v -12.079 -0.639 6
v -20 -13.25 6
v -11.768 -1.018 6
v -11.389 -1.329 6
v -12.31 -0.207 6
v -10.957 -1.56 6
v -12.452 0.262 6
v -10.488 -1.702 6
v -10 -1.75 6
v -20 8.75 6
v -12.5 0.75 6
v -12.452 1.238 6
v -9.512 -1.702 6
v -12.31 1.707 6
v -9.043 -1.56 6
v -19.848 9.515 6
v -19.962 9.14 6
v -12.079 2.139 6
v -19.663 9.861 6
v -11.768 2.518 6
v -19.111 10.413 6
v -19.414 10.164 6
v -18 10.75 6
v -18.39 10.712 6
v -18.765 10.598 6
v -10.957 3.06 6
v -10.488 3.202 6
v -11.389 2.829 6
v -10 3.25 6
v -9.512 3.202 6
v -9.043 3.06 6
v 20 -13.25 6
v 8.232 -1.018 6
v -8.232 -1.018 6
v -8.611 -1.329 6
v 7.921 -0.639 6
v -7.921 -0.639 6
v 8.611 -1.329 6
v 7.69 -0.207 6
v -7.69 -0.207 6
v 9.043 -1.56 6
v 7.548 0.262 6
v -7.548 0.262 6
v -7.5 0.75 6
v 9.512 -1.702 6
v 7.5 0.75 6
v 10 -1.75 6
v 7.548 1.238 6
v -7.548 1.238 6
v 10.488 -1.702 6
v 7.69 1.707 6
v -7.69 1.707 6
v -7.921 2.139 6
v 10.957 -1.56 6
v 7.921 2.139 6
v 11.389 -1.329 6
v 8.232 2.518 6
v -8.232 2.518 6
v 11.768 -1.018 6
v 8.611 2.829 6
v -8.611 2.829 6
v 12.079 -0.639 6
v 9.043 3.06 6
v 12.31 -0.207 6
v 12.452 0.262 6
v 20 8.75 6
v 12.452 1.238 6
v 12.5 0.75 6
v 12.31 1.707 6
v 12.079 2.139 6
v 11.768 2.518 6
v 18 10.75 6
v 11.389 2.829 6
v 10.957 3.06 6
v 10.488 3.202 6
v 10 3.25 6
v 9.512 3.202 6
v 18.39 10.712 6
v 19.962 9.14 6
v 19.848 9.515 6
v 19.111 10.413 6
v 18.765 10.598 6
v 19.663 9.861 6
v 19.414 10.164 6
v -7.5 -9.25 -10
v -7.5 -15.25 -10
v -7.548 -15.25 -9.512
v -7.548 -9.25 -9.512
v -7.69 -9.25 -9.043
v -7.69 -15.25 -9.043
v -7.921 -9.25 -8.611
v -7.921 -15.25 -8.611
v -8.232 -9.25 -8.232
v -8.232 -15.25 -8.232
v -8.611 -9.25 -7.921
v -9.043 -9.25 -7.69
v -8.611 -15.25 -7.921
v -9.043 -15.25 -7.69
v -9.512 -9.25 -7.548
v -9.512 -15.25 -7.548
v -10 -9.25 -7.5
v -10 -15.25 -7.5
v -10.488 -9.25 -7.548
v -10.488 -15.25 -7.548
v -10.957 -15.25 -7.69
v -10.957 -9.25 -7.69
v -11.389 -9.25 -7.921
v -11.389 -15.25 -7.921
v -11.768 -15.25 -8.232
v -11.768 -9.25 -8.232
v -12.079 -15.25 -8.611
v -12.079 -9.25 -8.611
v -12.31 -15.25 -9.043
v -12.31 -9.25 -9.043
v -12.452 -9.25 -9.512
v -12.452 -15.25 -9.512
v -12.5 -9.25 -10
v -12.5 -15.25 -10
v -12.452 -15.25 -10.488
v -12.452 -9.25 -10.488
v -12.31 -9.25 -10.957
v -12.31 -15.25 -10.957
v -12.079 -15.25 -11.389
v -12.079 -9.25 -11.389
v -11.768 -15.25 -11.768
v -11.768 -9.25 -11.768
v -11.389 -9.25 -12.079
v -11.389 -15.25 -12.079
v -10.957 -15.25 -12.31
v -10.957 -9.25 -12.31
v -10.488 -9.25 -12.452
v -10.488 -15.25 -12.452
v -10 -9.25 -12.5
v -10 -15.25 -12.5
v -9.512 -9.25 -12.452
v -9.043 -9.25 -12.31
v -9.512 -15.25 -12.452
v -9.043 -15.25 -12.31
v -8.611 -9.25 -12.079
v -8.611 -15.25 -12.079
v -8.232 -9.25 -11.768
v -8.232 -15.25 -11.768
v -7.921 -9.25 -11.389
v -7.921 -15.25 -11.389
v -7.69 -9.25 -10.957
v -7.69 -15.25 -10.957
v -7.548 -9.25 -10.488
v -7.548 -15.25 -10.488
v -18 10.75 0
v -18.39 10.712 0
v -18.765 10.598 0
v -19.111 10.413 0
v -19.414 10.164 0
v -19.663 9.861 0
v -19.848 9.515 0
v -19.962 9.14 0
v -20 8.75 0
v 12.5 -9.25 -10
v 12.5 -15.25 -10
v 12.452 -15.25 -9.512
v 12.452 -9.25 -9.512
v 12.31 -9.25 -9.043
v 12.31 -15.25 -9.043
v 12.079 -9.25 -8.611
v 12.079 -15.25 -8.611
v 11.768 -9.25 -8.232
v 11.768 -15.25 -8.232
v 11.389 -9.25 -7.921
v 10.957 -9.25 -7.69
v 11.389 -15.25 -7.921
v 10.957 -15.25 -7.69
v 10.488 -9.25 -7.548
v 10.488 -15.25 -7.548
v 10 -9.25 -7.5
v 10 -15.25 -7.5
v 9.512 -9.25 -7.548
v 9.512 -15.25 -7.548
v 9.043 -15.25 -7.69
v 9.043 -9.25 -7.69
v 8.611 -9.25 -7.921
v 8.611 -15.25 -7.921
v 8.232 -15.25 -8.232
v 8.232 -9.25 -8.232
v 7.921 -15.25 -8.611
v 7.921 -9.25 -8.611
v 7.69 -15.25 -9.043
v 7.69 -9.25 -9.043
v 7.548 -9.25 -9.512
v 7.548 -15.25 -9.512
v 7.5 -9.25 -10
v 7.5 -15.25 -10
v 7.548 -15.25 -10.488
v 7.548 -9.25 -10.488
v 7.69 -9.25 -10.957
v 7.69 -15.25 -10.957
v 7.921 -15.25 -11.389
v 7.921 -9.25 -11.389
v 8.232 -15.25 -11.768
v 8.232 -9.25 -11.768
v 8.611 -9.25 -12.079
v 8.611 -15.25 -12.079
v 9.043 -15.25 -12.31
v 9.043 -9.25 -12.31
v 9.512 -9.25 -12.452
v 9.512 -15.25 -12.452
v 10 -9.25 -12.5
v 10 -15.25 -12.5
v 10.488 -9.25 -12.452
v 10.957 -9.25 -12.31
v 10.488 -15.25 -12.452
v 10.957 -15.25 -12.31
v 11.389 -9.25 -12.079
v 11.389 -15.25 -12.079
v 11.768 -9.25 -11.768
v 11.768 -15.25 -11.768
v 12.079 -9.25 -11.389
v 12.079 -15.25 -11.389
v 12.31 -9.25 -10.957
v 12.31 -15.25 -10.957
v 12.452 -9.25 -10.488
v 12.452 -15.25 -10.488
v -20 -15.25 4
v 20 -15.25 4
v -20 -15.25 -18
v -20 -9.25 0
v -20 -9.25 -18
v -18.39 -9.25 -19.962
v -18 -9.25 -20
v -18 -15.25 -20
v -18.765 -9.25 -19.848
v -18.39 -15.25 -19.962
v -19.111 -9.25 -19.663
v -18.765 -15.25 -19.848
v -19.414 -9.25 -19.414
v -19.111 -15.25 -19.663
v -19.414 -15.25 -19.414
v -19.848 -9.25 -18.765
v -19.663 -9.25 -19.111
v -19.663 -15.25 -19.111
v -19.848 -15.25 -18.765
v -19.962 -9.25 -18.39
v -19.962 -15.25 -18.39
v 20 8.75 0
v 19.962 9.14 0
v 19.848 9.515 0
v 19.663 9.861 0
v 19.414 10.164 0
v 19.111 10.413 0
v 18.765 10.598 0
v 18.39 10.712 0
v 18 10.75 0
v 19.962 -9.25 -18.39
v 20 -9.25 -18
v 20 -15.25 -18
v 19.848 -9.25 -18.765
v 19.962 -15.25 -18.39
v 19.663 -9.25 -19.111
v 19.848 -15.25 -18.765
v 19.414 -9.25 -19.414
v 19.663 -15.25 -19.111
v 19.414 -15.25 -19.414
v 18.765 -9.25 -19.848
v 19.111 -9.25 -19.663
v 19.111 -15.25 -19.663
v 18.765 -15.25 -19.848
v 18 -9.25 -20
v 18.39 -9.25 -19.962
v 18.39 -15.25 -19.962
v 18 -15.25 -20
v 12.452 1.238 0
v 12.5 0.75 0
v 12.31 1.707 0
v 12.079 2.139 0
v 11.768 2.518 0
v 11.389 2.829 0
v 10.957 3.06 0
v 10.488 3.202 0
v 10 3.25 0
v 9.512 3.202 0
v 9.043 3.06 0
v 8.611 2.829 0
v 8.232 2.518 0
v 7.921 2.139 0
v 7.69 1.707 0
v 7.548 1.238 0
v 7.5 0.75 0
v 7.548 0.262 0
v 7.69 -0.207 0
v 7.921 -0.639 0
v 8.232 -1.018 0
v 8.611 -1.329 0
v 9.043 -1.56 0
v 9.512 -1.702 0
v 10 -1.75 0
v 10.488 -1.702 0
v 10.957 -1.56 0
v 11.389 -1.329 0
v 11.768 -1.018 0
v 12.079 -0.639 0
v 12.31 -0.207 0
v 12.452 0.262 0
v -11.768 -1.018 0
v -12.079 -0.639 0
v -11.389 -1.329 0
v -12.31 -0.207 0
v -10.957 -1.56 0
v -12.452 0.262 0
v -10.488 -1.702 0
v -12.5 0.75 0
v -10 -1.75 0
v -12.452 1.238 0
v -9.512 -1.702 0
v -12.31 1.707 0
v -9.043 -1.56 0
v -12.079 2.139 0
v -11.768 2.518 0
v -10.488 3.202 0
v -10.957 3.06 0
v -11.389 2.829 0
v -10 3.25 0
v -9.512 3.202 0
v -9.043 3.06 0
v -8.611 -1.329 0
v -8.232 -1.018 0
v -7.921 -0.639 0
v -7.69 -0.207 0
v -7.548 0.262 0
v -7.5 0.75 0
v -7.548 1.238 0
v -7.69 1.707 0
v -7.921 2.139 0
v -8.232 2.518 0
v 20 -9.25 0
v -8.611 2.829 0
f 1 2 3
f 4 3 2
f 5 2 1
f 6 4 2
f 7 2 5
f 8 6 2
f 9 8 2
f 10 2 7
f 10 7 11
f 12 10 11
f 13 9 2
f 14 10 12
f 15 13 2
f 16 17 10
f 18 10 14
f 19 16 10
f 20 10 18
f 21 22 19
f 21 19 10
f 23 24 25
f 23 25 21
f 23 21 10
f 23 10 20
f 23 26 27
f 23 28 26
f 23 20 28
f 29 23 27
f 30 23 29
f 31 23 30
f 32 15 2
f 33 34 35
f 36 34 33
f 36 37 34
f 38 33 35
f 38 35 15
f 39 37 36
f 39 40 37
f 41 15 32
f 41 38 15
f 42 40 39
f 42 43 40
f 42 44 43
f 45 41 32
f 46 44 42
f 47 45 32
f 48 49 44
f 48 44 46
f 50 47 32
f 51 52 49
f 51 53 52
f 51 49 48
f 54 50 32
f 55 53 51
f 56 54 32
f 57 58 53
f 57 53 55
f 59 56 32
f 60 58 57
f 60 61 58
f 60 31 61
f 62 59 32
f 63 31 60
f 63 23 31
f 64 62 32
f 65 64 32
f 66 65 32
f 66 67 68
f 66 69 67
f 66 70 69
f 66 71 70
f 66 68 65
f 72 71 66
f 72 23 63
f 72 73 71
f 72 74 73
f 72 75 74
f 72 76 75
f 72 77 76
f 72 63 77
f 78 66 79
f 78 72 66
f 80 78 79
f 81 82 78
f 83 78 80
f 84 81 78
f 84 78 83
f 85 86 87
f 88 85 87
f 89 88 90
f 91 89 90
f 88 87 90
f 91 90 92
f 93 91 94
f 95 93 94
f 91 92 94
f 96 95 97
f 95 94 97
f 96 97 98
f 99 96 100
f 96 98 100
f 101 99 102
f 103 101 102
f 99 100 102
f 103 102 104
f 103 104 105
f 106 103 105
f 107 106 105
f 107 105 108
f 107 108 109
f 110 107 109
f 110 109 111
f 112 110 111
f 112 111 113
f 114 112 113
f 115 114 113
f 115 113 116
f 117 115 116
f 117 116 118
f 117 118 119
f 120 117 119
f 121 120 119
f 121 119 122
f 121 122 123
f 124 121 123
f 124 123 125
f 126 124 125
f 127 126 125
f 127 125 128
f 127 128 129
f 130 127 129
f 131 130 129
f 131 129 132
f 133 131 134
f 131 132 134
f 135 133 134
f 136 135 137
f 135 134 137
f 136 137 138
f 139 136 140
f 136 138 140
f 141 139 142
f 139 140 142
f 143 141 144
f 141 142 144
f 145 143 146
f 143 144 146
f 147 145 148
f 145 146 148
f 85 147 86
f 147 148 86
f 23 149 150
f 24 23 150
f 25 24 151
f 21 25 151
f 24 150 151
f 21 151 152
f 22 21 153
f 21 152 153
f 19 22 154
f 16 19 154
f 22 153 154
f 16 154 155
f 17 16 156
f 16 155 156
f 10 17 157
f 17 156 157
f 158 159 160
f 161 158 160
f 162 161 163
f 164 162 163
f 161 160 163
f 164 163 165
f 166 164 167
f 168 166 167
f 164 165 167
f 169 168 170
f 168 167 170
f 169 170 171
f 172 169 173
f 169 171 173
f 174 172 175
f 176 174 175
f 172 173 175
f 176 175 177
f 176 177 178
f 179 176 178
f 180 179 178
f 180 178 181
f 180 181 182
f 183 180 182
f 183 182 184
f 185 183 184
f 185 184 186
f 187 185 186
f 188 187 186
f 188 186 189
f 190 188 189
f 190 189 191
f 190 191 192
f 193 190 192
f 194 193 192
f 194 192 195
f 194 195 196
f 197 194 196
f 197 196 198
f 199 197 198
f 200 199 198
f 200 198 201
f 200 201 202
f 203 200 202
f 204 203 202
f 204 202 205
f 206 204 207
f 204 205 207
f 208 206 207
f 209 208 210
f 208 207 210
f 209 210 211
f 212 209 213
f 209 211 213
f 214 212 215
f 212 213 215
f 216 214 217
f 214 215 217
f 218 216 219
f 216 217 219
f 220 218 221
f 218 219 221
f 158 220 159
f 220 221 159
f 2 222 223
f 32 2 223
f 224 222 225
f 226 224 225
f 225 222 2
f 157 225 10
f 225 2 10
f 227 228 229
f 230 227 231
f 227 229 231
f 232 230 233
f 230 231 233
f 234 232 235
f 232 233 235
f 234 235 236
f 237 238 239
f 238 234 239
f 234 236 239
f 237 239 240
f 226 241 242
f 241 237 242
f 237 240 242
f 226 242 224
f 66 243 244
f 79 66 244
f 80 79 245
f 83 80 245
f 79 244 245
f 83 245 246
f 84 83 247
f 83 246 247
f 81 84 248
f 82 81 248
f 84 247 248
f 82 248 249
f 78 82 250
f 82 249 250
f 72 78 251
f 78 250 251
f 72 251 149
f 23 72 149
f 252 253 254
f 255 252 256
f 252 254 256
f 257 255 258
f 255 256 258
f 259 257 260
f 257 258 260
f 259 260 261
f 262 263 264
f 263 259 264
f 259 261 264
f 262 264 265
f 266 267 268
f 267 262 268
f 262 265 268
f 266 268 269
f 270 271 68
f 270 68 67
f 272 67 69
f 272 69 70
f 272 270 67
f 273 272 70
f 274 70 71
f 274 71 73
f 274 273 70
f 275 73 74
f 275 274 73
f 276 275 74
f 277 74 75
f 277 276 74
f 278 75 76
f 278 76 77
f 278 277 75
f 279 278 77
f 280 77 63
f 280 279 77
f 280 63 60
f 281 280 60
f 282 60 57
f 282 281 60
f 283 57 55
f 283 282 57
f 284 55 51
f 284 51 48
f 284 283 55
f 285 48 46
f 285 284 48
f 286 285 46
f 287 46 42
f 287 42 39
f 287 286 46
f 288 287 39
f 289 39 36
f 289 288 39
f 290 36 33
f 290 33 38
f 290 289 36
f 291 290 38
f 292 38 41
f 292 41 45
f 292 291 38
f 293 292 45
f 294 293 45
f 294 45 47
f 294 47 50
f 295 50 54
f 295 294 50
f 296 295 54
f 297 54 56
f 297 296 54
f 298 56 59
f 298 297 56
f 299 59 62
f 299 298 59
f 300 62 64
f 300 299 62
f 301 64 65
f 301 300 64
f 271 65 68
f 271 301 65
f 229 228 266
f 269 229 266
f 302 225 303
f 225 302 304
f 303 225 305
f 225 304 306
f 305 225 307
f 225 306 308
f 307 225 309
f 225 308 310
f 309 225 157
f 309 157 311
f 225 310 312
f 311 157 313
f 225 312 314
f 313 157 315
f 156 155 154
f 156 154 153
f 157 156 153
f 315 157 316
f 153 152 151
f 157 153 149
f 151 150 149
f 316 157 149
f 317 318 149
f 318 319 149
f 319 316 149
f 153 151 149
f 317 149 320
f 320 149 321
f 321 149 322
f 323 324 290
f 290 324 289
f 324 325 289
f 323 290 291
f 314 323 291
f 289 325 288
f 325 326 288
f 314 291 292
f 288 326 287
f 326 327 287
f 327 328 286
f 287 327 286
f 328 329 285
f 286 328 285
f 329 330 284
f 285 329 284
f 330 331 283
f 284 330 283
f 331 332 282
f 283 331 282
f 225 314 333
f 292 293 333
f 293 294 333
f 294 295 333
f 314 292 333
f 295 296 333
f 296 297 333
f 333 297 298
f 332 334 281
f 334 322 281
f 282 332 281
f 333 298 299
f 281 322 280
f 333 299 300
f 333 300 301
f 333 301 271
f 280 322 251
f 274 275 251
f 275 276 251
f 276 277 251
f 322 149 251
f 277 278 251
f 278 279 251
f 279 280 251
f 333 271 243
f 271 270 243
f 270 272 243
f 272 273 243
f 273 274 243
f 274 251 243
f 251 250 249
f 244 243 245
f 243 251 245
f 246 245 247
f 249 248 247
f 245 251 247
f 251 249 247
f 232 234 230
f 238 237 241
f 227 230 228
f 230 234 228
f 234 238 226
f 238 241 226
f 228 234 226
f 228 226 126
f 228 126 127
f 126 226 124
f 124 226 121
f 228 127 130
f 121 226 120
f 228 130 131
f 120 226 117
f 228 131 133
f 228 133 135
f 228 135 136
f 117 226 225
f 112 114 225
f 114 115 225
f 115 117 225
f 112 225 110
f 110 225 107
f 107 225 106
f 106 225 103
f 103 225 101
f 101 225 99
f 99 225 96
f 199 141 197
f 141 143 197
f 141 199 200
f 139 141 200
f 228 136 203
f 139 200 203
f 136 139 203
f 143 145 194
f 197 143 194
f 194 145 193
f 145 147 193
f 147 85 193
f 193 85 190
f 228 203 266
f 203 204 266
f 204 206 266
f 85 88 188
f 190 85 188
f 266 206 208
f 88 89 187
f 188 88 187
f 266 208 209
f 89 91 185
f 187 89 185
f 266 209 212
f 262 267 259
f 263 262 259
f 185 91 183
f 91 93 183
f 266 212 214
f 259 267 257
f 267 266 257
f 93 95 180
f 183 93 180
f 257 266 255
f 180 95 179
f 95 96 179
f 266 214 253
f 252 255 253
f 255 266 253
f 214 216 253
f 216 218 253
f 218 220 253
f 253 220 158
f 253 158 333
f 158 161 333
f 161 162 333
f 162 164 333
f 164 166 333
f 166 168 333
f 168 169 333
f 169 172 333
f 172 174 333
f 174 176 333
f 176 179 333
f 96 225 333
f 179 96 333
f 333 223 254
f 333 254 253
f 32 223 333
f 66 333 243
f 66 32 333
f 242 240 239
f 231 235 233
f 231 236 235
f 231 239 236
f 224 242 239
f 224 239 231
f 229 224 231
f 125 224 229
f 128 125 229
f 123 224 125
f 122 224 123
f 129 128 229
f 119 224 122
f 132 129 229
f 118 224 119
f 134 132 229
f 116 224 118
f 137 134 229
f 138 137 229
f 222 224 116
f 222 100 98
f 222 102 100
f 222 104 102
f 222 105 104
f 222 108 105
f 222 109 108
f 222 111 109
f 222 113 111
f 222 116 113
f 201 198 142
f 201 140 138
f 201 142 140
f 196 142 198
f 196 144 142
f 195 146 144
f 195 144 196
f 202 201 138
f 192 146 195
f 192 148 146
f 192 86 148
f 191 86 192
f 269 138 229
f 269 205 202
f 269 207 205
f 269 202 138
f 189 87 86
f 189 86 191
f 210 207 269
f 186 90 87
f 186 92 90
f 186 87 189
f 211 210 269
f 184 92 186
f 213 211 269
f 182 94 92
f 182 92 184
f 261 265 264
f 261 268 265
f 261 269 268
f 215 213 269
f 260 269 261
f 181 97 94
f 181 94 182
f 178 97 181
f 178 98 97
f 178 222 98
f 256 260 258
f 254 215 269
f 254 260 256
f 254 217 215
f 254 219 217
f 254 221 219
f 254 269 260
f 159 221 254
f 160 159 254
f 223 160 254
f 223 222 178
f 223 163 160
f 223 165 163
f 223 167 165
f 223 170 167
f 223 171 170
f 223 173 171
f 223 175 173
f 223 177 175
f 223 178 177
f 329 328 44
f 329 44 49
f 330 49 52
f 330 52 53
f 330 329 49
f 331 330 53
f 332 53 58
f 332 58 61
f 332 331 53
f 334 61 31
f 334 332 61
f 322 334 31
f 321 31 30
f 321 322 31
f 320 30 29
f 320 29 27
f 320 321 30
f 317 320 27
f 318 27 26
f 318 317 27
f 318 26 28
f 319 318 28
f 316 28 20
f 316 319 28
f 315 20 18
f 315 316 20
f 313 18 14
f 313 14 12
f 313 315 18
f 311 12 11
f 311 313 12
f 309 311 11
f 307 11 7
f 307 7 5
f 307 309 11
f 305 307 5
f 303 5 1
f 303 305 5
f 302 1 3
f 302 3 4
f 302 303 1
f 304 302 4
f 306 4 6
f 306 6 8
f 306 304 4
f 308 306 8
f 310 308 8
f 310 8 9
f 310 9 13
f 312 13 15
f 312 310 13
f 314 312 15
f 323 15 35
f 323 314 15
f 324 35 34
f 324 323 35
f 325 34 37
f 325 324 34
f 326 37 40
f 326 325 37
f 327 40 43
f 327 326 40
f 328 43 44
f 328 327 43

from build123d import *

# Parameters (mm, degrees)
SKETCH1_R           = 2.5
BOSS_EXTRUDE2_DEPTH = 6
SKETCH3_W           = 40
SKETCH3_H           = 6
BOSS_EXTRUDE3_DEPTH = 26
SKETCH4_R           = 2.5
CUT_EXTRUDE2_DEPTH  = 26
CHAMFER1_SIZE       = 2


with BuildPart() as part:
    # Sketch1 → Boss-Extrude2 (new body)
    with BuildSketch(Plane.XY):
        with BuildLine():
            Line((-20, -9.25), (20, -9.25))
            Line((20, -9.25), (20, 8.75))
            ThreePointArc((20, 8.75), (19.414213562, 10.164213562), (18, 10.75))
            Line((18, 10.75), (-18, 10.75))
            ThreePointArc((-18, 10.75), (-19.414213562, 10.164213562), (-20, 8.75))
            Line((-20, 8.75), (-20, -9.25))
        make_face()
        with Locations((-10, 0.75)):
            Circle(SKETCH1_R, mode=Mode.SUBTRACT)
        with Locations((10, 0.75)):
            Circle(SKETCH1_R, mode=Mode.SUBTRACT)
    extrude(amount=BOSS_EXTRUDE2_DEPTH)

    # Sketch3 → Boss-Extrude3 (add)
    with BuildSketch(Plane.XY.offset(6)):
        with Locations((0, -12.25)):
            Rectangle(SKETCH3_W, SKETCH3_H)
    extrude(amount=-BOSS_EXTRUDE3_DEPTH)

    # Sketch4 → Cut-Extrude2 (cut)
    with BuildSketch(Plane.XZ.offset(15.25)):
        with Locations((-10, -10)):
            Circle(SKETCH4_R)
        with Locations((10, -10)):
            Circle(SKETCH4_R)
        with BuildLine():
            Line((-20, -20), (-18, -20))
            ThreePointArc((-18, -20), (-19.414213562, -19.414213562), (-20, -18))
            Line((-20, -18), (-20, -20))
        make_face()
        with BuildLine():
            ThreePointArc((20, -18), (19.414213562, -19.414213562), (18, -20))
            Line((18, -20), (20, -20))
            Line((20, -20), (20, -18))
        make_face()
    extrude(amount=-CUT_EXTRUDE2_DEPTH, mode=Mode.SUBTRACT)

    # Chamfer1
    chamfer1_edges = [part.edges().sort_by_distance(p)[0] for p in [
        (0, -15.25, 6),
    ]]
    chamfer(chamfer1_edges, length=CHAMFER1_SIZE)


solid = part.part
